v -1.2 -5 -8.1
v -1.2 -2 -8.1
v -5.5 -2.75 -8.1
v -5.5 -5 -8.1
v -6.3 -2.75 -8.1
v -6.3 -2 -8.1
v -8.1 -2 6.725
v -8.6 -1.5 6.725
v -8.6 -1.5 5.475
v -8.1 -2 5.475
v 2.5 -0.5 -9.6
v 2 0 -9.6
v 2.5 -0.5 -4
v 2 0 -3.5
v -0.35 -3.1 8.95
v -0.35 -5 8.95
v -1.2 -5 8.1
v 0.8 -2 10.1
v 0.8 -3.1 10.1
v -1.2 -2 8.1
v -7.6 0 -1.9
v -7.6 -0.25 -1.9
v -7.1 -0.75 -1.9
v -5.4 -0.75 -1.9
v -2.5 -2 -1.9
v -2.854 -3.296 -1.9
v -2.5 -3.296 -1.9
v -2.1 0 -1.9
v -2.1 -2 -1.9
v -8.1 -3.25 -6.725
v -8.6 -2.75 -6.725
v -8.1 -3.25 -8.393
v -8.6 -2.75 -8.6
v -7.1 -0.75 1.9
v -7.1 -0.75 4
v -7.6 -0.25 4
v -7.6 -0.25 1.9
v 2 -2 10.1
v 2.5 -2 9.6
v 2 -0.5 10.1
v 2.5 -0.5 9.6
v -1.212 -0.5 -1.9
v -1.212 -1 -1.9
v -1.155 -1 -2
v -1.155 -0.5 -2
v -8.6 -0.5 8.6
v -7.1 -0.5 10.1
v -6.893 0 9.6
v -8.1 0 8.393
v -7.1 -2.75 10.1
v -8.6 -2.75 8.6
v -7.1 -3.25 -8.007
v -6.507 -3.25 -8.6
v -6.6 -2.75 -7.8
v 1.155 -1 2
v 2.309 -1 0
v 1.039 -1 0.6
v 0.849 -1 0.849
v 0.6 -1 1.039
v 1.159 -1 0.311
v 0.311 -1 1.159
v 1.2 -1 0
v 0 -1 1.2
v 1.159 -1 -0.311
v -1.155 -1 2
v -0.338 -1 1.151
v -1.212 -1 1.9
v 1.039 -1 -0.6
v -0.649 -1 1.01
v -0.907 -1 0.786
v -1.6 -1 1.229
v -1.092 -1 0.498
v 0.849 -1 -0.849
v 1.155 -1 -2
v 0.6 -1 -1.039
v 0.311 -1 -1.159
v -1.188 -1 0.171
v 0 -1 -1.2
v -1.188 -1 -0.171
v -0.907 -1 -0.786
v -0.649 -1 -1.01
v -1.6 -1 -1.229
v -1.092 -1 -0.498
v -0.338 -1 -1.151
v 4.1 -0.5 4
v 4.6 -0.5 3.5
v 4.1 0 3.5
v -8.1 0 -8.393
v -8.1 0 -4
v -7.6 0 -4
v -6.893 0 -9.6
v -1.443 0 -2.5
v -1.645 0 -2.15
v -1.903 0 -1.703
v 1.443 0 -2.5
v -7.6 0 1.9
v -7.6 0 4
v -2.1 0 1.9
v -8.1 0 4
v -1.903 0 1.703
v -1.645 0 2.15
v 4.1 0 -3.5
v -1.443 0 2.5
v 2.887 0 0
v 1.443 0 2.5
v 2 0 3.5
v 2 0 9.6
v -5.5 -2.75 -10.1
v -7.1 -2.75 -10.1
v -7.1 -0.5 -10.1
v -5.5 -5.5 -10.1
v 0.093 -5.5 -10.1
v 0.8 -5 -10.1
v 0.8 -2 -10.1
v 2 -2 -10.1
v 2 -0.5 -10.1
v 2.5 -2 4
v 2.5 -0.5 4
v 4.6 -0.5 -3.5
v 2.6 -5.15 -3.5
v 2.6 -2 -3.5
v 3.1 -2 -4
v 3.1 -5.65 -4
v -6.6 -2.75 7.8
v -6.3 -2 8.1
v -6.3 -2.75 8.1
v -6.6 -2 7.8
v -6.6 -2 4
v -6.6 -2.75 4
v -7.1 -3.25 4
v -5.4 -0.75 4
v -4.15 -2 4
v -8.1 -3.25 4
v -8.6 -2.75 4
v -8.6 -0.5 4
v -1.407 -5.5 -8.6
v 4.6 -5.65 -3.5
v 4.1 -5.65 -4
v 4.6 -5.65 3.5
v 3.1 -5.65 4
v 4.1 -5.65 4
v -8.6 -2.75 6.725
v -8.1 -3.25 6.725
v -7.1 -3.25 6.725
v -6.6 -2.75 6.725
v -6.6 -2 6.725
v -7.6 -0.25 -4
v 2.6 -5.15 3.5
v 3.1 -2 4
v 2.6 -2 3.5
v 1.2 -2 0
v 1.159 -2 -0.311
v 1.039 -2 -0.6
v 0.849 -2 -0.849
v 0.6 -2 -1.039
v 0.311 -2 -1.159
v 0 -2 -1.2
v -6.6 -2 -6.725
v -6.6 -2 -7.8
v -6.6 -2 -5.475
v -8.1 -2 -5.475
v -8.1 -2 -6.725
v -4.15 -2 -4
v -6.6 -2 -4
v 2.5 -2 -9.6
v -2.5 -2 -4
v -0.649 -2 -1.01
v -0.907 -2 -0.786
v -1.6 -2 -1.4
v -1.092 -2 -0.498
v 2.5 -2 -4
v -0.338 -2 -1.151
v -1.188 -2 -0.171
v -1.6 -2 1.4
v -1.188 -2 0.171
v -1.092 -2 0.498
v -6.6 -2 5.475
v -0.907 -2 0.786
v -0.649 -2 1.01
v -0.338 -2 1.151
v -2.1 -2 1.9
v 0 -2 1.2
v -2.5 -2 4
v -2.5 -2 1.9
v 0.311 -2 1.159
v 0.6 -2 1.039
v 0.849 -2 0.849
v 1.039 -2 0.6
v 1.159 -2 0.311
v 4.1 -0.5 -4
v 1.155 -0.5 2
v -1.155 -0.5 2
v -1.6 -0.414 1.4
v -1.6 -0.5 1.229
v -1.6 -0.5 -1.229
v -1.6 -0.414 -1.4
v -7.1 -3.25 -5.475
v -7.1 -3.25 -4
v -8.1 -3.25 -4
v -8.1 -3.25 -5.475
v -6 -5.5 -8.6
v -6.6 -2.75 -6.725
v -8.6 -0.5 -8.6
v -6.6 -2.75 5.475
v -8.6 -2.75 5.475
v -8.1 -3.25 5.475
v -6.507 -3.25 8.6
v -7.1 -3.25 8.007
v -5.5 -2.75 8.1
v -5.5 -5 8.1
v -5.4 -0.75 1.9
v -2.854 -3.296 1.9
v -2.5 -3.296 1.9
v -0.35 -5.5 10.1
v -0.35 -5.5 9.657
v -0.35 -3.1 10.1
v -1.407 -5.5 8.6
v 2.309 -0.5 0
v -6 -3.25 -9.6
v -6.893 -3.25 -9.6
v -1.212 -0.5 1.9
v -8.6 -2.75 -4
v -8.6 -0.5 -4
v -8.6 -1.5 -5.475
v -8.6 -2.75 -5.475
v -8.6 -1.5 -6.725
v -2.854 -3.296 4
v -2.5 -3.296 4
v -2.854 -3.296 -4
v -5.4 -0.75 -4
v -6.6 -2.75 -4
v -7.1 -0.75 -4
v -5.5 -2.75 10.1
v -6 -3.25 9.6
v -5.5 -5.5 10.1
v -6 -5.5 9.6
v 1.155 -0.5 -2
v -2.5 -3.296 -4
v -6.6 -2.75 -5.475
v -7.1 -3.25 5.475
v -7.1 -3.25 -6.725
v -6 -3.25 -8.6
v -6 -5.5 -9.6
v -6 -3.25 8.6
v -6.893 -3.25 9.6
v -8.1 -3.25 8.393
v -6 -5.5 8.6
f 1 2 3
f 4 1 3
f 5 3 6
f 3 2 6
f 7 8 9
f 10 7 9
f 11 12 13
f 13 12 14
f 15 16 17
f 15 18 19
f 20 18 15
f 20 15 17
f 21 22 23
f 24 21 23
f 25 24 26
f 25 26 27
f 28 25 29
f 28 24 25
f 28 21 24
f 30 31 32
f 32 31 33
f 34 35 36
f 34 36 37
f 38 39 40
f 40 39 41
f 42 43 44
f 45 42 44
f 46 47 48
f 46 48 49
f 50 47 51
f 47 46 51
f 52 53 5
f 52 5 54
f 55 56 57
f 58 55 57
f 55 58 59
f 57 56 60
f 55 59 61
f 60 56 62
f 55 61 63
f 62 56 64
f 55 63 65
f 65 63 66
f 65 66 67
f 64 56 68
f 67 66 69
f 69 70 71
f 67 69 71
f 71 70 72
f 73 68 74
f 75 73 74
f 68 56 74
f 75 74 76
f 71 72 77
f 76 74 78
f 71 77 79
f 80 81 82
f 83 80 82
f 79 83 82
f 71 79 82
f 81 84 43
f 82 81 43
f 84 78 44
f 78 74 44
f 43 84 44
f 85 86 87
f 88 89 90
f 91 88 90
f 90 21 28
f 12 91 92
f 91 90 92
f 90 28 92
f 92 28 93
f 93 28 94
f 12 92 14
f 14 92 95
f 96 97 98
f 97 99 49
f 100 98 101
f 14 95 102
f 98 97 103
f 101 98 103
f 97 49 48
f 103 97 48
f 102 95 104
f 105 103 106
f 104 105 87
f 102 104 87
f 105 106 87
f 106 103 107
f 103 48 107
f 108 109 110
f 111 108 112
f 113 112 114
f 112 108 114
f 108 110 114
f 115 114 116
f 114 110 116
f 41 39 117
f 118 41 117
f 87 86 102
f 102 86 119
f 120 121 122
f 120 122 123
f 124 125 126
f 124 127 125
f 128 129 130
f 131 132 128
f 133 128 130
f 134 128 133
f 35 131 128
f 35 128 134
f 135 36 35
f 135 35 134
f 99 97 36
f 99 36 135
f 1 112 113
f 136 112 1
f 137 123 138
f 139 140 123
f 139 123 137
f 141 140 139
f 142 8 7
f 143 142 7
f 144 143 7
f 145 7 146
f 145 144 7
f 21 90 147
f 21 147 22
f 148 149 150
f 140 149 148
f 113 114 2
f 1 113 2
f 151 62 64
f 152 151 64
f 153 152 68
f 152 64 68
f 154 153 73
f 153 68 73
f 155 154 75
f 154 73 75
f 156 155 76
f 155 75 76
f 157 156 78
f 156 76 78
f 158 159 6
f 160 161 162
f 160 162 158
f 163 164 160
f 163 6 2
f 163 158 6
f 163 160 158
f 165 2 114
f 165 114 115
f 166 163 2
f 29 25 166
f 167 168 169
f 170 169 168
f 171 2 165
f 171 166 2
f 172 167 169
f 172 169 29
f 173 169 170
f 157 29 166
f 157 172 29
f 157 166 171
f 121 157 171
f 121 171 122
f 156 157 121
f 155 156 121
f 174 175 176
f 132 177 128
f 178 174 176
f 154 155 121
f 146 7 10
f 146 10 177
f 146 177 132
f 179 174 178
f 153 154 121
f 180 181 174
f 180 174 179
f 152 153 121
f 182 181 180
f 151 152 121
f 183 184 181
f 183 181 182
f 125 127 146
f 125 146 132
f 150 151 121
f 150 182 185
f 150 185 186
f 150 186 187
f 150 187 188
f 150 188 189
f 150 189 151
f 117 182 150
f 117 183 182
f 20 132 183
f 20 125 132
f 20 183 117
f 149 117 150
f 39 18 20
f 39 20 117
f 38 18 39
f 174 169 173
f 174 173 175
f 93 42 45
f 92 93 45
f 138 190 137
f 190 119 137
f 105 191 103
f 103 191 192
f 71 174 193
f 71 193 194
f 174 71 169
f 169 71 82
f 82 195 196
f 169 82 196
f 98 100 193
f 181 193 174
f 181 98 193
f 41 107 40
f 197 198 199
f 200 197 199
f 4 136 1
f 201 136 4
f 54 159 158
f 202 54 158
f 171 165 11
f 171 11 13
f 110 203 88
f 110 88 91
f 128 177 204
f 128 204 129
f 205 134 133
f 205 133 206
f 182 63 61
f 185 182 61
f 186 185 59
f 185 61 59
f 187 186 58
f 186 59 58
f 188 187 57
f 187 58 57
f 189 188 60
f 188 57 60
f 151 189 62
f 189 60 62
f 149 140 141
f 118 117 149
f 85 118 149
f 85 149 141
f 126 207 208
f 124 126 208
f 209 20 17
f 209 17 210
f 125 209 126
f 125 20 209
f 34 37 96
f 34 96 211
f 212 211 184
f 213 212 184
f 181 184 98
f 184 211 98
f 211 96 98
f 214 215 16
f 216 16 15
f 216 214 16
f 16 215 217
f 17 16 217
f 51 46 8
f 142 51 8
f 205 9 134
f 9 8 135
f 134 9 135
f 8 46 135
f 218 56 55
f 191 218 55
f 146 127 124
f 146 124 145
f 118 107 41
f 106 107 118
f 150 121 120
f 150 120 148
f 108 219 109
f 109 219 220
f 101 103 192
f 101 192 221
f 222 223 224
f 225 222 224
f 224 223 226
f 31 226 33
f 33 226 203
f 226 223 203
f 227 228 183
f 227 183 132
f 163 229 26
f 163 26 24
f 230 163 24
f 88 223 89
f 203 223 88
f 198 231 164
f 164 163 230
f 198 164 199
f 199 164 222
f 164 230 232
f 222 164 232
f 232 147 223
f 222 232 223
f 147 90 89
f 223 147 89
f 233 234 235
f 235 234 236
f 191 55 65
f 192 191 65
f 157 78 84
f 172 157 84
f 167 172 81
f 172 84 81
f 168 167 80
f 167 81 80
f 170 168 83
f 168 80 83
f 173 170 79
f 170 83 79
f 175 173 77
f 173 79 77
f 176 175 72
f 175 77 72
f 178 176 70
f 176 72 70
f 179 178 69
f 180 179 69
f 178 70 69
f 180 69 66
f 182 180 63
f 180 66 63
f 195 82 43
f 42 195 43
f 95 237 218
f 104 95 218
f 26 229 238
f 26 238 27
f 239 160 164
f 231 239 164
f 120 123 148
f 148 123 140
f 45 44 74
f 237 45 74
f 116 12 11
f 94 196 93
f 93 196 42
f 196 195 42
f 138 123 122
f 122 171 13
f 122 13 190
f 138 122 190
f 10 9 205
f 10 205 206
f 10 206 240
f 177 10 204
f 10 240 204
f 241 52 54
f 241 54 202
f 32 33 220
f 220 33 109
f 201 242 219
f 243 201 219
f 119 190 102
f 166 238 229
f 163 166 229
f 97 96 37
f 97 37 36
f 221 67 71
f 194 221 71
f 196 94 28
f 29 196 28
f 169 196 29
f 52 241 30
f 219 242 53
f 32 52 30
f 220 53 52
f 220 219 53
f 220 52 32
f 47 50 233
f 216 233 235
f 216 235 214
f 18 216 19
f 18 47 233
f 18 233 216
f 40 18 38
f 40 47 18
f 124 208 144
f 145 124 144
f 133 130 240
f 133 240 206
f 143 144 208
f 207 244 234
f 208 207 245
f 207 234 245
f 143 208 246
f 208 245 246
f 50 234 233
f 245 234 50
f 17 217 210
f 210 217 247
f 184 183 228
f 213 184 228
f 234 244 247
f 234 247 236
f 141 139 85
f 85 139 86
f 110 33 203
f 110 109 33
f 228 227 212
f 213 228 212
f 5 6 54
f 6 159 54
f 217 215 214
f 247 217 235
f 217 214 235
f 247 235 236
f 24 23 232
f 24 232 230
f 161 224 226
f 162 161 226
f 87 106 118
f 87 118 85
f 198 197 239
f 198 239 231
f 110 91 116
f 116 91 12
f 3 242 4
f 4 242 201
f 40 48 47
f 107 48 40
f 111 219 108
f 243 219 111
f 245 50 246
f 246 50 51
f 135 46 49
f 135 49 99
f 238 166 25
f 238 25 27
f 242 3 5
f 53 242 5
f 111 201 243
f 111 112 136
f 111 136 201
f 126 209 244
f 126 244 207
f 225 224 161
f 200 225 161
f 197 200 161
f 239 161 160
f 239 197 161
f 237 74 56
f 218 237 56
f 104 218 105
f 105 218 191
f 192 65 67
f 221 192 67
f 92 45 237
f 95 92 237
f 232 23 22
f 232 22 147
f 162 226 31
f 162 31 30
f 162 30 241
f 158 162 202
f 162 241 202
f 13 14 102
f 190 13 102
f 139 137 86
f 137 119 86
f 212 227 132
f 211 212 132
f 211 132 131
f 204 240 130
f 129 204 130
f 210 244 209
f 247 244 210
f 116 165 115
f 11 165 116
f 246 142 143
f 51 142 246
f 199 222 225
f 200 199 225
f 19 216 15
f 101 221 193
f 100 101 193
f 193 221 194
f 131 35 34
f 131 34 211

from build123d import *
from OCP.BRepFilletAPI import BRepFilletAPI_MakeChamfer

# Parameters (mm, degrees)
SKETCH1_W                = 13.2
SKETCH1_H                = 8
BOSS_EXTRUDE1_DEPTH      = 2
CUT_EXTRUDE1_DEPTH       = 12.914696807
CUT_EXTRUDE1_DEPTH_BACK  = 12.914696807
SKETCH3_W                = 2
SKETCH3_H                = 8
BOSS_EXTRUDE2_DEPTH      = 3.65
BOSS_EXTRUDE3_DEPTH      = 2
BOSS_EXTRUDE4_DEPTH      = 1.25
BOSS_EXTRUDE5_DEPTH      = 2.1
BOSS_EXTRUDE6_DEPTH      = 2.25
CHAMFER3_SIZE            = 1.5
CHAMFER4_SIZE            = 0.3
CHAMFER3_OF_MIRROR1_SIZE = 1.5
CHAMFER4_OF_MIRROR1_SIZE = 0.3
CUT_EXTRUDE2_DEPTH       = 15.141428499
CUT_EXTRUDE2_DEPTH_BACK  = 15.141428499
SKETCH10_W               = 1
SKETCH10_H               = 8
CUT_EXTRUDE3_DEPTH       = 15.418477728
CUT_EXTRUDE3_DEPTH_BACK  = 1
SKETCH12_W               = 6
SKETCH12_H               = 3.8
CUT_EXTRUDE4_DEPTH       = 15.418477728
CUT_EXTRUDE5_REACH       = 24.67
SKETCH13_W               = 1.15
SKETCH13_H               = 2.4
CHAMFER7_SIZE            = 0.5
CHAMFER7_SIZE_2          = 0.353553391
CUT_EXTRUDE6_REACH       = 15.658
SKETCH14_W               = 2
SKETCH14_H               = 1.25
CHAMFER8_SIZE            = 0.5


with BuildPart() as part:
    # Sketch1 → Boss-Extrude1 (new body)
    with BuildSketch(Plane(origin=(0, 0, 0), x_dir=(1, 0, 0), z_dir=(0, 1, 0))):
        with Locations((-2, 0)):
            Rectangle(SKETCH1_W, SKETCH1_H)
        with BuildLine():
            ThreePointArc((0, 1.2), (-1.2, 0), (0, -1.2))
            ThreePointArc((0, -1.2), (0.848528137, -0.848528137), (1.2, 0))
            ThreePointArc((1.2, 0), (0.848528137, 0.848528137), (0, 1.2))
        make_face(mode=Mode.SUBTRACT)
    extrude(amount=-BOSS_EXTRUDE1_DEPTH)

    # Sketch2 → Cut-Extrude1 (cut, two sides: drawn at the far end of the back side and taken through both)
    with BuildSketch(Plane(origin=(0, 0, -4), x_dir=(-1, 0, 0), z_dir=(0, 0, -1)).offset(-CUT_EXTRUDE1_DEPTH_BACK)):
        Polygon((8.6, -2), (8.6, -0.75), (3.75, -0.75), (2.5, -2), align=None)
    extrude(amount=CUT_EXTRUDE1_DEPTH + CUT_EXTRUDE1_DEPTH_BACK, mode=Mode.SUBTRACT)

    # Sketch3 → Boss-Extrude2 (add)
    with BuildSketch(Plane.XZ.offset(2)):
        with Locations((3.6, 0)):
            Rectangle(SKETCH3_W, SKETCH3_H)
    extrude(amount=BOSS_EXTRUDE2_DEPTH)

    # Sketch4 → Boss-Extrude3 (add)
    with BuildSketch(Plane(origin=(0, -2, 2), x_dir=(1, 0, 0), z_dir=(0, 1, 0))):
        Polygon((-8.6, -8.1), (0.8, -8.1), (2.5, -8.1), (2.5, -2), (0.8, -2), (-8.6, -2), align=None)
    boss_extrude3 = extrude(amount=BOSS_EXTRUDE3_DEPTH)

    # Sketch5 → Boss-Extrude4 (add)
    with BuildSketch(Plane.XZ.offset(2)):
        Polygon((-8.6, 10.1), (-6.6, 10.1), (-1.2, 10.1), (0.8, 10.1), (-1.2, 8.1), (-6.6, 8.1), (-6.6, 4), (-8.6, 4), align=None)
    boss_extrude4 = extrude(amount=BOSS_EXTRUDE4_DEPTH)

    # Sketch6 → Boss-Extrude5 (add)
    with BuildSketch(Plane(origin=(0, 0, 4), x_dir=(-1, 0, 0), z_dir=(0, 0, -1))):
        Polygon((2.5, -2), (2.5, -3.65), (5.4, -0.75), (3.75, -0.75), align=None)
    boss_extrude5 = extrude(amount=BOSS_EXTRUDE5_DEPTH)

    # Sketch8 → Boss-Extrude6 (add)
    with BuildSketch(Plane.XZ.offset(3.25)):
        Polygon((0.8, 10.1), (-1.2, 8.1), (-6, 8.1), (-6, 10.1), align=None)
    boss_extrude6 = extrude(amount=BOSS_EXTRUDE6_DEPTH)

    # Chamfer3
    chamfer3_edges = [part.edges().sort_by_distance(p)[0] for p in [
        (-8.6, -1.625, 10.1),
    ]]
    chamfer(chamfer3_edges, length=CHAMFER3_SIZE)

    # Chamfer4
    chamfer4_edges = [part.edges().sort_by_distance(p)[0] for p in [
        (-6.6, -2.625, 8.1),
    ]]
    chamfer(chamfer4_edges, length=CHAMFER4_SIZE)

    # Mirror1: Boss-Extrude3, Boss-Extrude4, Boss-Extrude5, Boss-Extrude6 across plane
    add(boss_extrude3.mirror(Plane.XY))
    add(boss_extrude4.mirror(Plane.XY))
    add(boss_extrude5.mirror(Plane.XY))
    add(boss_extrude6.mirror(Plane.XY))

    # Chamfer3 of Mirror1
    chamfer3_of_mirror1_edges = [part.edges().sort_by_distance(p)[0] for p in [
        (-8.6, -1.625, -10.1),
    ]]
    chamfer(chamfer3_of_mirror1_edges, length=CHAMFER3_OF_MIRROR1_SIZE)

    # Chamfer4 of Mirror1
    chamfer4_of_mirror1_edges = [part.edges().sort_by_distance(p)[0] for p in [
        (-6.6, -2.625, -8.1),
    ]]
    chamfer(chamfer4_of_mirror1_edges, length=CHAMFER4_OF_MIRROR1_SIZE)

    # Sketch10 → Cut-Extrude2 (cut, two sides: drawn at the far end of the back side and taken through both)
    with BuildSketch(Plane.XZ.offset(0.75).offset(-CUT_EXTRUDE2_DEPTH_BACK)):
        with Locations((-8.1, 0)):
            Rectangle(SKETCH10_W, SKETCH10_H)
    extrude(amount=CUT_EXTRUDE2_DEPTH + CUT_EXTRUDE2_DEPTH_BACK, mode=Mode.SUBTRACT)

    # Sketch11 → Cut-Extrude3 (cut, two sides: drawn at the far end of the back side and taken through both)
    with BuildSketch(Plane(origin=(0, 0, 0), x_dir=(1, 0, 0), z_dir=(0, 1, 0)).offset(-CUT_EXTRUDE3_DEPTH_BACK)):
        Polygon((1.154700538, -2), (-1.154700538, -2), (-1.212435565, -1.9), (-2.309401077, 0), (-1.212435565, 1.9), (-1.154700538, 2), (1.154700538, 2), (2.309401077, 0), align=None)
    extrude(amount=CUT_EXTRUDE3_DEPTH + CUT_EXTRUDE3_DEPTH_BACK, mode=Mode.SUBTRACT)

    # Sketch12 → Cut-Extrude4 (cut, through all)
    with BuildSketch(Plane(origin=(0, 0, 0), x_dir=(1, 0, 0), z_dir=(0, 1, 0))):
        with Locations((-4.6, 0)):
            Rectangle(SKETCH12_W, SKETCH12_H)
    extrude(amount=-CUT_EXTRUDE4_DEPTH, mode=Mode.SUBTRACT)

    # Sketch13 → Cut-Extrude5 (cut, up to next)
    with BuildSketch(Plane.XY.offset(10.1), mode=Mode.PRIVATE) as cut_extrude5_sk1:
        with Locations((0.225, -4.3)):
            Rectangle(SKETCH13_W, SKETCH13_H)
    cut_extrude5_tool1 = extrude(cut_extrude5_sk1.sketch, amount=-CUT_EXTRUDE5_REACH, mode=Mode.PRIVATE) & part.part
    add(cut_extrude5_tool1.solids().sort_by_distance((0.225, -4.3, 10.1))[0], mode=Mode.SUBTRACT)

    # Chamfer7
    chamfer7_edges = [part.edges().sort_by_distance(p)[0] for p in [
        (-1.6, -1, 1.9),
        (-1.6, -1, -1.9),
    ]]
    chamfer(chamfer7_edges, length=CHAMFER7_SIZE)
    chamfer7_2_edges_1 = [part.edges().sort_by_distance(p)[0] for p in [
        (-6.6, -3.25, -5.9),
        (-6.45, -3.25, -7.95),
        (-6.15, -3.25, -8.1),
        (-6.15, -3.25, 8.1),
        (-6.45, -3.25, 7.95),
        (-6.6, -3.25, 5.9),
        (-8.6, -3.25, 6.3),
        (-7.85, -3.25, 9.35),
        (-6.55, -3.25, 10.1),
        (-6, -4.375, 10.1),
        (-6, -4.375, -10.1),
        (-6.55, -3.25, -10.1),
        (-7.85, -3.25, -9.35),
        (-8.6, -3.25, -6.3),
        (-3.6, -5.5, 8.1),
        (-0.775, -5.5, 8.525),
        (-0.2, -5.5, -9.1),
        (-3.6, -5.5, -8.1),
        (2.6, -3.825, 4),
        (2.6, -3.825, -4),
        (2.6, -5.65, 0),
        (-1.377350269, 0, 1.614359354),
        (0, 0, 2),
        (1.732050808, 0, 1),
        (1.732050808, 0, -1),
        (0, 0, -2),
        (-1.377350269, 0, -1.614359354),
        (4.6, -2.825, -4),
        (4.6, -2.825, 4),
        (-8.6, 0, -6.3),
        (-7.85, 0, -9.35),
        (-8.6, 0, 6.3),
        (-7.85, 0, 9.35),
        (-2.3, 0, -10.1),
        (2.5, 0, -7.05),
        (3.55, 0, -4),
        (4.6, 0, 0),
        (3.55, 0, 4),
        (2.5, 0, 7.05),
        (-2.3, 0, 10.1),
        (2.5, -1, -10.1),
        (2.5, -1, 10.1),
        (-6, -4.375, 8.1),
        (-6, -4.375, -8.1),
        (-7.6, -0.75, 2.95),
        (-7.6, -0.75, -2.95),
    ]]
    chamfer7_2_edges_2 = [part.edges().sort_by_distance(p)[0] for p in [
        (-2.5, -3.65, -2.95),
    ]]
    chamfer7_2_side_2 = [part.faces().sort_by_distance(p)[0] for p in [
        (-2.5, -3.642928932, -2.95),
    ]]
    chamfer7_2_edges_3 = [part.edges().sort_by_distance(p)[0] for p in [
        (-2.5, -3.65, 2.95),
    ]]
    chamfer7_2_side_3 = [part.faces().sort_by_distance(p)[0] for p in [
        (-2.5, -3.642928932, 2.95),
    ]]
    chamfer7_2 = BRepFilletAPI_MakeChamfer(part.part.solid().wrapped)
    for e in chamfer7_2_edges_1:
        chamfer7_2.Add(CHAMFER7_SIZE, e.wrapped)
    for e in chamfer7_2_edges_2:
        chamfer7_2.Add(CHAMFER7_SIZE_2, CHAMFER7_SIZE, e.wrapped, chamfer7_2_side_2[0].wrapped)
    for e in chamfer7_2_edges_3:
        chamfer7_2.Add(CHAMFER7_SIZE_2, CHAMFER7_SIZE, e.wrapped, chamfer7_2_side_3[0].wrapped)
    add(Compound.cast(chamfer7_2.Shape()), mode=Mode.REPLACE)

    # Cut-Extrude6: up to this face of the body (flat: up to its plane)
    cut_extrude6_end = Plane(part.part.faces().sort_by_distance((1.4, -2, 9.875917426))[0])
    # Sketch14 → Cut-Extrude6 (cut, up to the picked face)
    with BuildSketch(Plane.XZ.offset(3.25), mode=Mode.PRIVATE) as cut_extrude6_sk1:
        with Locations((-7.6, -6.1)):
            Rectangle(SKETCH14_W, SKETCH14_H)
    cut_extrude6_tool1 = split(extrude(cut_extrude6_sk1.sketch, amount=-CUT_EXTRUDE6_REACH, mode=Mode.PRIVATE), bisect_by=cut_extrude6_end, keep=Keep.BOTH, mode=Mode.PRIVATE)
    # Sketch14 → Cut-Extrude6 (cut, up to the picked face)
    with BuildSketch(Plane.XZ.offset(3.25), mode=Mode.PRIVATE) as cut_extrude6_sk2:
        with Locations((-7.6, 6.1)):
            Rectangle(SKETCH14_W, SKETCH14_H)
    cut_extrude6_tool2 = split(extrude(cut_extrude6_sk2.sketch, amount=-CUT_EXTRUDE6_REACH, mode=Mode.PRIVATE), bisect_by=cut_extrude6_end, keep=Keep.BOTH, mode=Mode.PRIVATE)
    add(cut_extrude6_tool1.solids().sort_by(Axis((-7.6, -3.25, -6.1), (0, 1, 0)))[0], mode=Mode.SUBTRACT)
    add(cut_extrude6_tool2.solids().sort_by(Axis((-7.6, -3.25, 6.1), (0, 1, 0)))[0], mode=Mode.SUBTRACT)

    # Chamfer8
    chamfer8_edges = [part.edges().sort_by_distance(p)[0] for p in [
        (-8.6, -2, -6.1),
        (-8.6, -2, 6.1),
    ]]
    chamfer(chamfer8_edges, length=CHAMFER8_SIZE)


solid = part.part
